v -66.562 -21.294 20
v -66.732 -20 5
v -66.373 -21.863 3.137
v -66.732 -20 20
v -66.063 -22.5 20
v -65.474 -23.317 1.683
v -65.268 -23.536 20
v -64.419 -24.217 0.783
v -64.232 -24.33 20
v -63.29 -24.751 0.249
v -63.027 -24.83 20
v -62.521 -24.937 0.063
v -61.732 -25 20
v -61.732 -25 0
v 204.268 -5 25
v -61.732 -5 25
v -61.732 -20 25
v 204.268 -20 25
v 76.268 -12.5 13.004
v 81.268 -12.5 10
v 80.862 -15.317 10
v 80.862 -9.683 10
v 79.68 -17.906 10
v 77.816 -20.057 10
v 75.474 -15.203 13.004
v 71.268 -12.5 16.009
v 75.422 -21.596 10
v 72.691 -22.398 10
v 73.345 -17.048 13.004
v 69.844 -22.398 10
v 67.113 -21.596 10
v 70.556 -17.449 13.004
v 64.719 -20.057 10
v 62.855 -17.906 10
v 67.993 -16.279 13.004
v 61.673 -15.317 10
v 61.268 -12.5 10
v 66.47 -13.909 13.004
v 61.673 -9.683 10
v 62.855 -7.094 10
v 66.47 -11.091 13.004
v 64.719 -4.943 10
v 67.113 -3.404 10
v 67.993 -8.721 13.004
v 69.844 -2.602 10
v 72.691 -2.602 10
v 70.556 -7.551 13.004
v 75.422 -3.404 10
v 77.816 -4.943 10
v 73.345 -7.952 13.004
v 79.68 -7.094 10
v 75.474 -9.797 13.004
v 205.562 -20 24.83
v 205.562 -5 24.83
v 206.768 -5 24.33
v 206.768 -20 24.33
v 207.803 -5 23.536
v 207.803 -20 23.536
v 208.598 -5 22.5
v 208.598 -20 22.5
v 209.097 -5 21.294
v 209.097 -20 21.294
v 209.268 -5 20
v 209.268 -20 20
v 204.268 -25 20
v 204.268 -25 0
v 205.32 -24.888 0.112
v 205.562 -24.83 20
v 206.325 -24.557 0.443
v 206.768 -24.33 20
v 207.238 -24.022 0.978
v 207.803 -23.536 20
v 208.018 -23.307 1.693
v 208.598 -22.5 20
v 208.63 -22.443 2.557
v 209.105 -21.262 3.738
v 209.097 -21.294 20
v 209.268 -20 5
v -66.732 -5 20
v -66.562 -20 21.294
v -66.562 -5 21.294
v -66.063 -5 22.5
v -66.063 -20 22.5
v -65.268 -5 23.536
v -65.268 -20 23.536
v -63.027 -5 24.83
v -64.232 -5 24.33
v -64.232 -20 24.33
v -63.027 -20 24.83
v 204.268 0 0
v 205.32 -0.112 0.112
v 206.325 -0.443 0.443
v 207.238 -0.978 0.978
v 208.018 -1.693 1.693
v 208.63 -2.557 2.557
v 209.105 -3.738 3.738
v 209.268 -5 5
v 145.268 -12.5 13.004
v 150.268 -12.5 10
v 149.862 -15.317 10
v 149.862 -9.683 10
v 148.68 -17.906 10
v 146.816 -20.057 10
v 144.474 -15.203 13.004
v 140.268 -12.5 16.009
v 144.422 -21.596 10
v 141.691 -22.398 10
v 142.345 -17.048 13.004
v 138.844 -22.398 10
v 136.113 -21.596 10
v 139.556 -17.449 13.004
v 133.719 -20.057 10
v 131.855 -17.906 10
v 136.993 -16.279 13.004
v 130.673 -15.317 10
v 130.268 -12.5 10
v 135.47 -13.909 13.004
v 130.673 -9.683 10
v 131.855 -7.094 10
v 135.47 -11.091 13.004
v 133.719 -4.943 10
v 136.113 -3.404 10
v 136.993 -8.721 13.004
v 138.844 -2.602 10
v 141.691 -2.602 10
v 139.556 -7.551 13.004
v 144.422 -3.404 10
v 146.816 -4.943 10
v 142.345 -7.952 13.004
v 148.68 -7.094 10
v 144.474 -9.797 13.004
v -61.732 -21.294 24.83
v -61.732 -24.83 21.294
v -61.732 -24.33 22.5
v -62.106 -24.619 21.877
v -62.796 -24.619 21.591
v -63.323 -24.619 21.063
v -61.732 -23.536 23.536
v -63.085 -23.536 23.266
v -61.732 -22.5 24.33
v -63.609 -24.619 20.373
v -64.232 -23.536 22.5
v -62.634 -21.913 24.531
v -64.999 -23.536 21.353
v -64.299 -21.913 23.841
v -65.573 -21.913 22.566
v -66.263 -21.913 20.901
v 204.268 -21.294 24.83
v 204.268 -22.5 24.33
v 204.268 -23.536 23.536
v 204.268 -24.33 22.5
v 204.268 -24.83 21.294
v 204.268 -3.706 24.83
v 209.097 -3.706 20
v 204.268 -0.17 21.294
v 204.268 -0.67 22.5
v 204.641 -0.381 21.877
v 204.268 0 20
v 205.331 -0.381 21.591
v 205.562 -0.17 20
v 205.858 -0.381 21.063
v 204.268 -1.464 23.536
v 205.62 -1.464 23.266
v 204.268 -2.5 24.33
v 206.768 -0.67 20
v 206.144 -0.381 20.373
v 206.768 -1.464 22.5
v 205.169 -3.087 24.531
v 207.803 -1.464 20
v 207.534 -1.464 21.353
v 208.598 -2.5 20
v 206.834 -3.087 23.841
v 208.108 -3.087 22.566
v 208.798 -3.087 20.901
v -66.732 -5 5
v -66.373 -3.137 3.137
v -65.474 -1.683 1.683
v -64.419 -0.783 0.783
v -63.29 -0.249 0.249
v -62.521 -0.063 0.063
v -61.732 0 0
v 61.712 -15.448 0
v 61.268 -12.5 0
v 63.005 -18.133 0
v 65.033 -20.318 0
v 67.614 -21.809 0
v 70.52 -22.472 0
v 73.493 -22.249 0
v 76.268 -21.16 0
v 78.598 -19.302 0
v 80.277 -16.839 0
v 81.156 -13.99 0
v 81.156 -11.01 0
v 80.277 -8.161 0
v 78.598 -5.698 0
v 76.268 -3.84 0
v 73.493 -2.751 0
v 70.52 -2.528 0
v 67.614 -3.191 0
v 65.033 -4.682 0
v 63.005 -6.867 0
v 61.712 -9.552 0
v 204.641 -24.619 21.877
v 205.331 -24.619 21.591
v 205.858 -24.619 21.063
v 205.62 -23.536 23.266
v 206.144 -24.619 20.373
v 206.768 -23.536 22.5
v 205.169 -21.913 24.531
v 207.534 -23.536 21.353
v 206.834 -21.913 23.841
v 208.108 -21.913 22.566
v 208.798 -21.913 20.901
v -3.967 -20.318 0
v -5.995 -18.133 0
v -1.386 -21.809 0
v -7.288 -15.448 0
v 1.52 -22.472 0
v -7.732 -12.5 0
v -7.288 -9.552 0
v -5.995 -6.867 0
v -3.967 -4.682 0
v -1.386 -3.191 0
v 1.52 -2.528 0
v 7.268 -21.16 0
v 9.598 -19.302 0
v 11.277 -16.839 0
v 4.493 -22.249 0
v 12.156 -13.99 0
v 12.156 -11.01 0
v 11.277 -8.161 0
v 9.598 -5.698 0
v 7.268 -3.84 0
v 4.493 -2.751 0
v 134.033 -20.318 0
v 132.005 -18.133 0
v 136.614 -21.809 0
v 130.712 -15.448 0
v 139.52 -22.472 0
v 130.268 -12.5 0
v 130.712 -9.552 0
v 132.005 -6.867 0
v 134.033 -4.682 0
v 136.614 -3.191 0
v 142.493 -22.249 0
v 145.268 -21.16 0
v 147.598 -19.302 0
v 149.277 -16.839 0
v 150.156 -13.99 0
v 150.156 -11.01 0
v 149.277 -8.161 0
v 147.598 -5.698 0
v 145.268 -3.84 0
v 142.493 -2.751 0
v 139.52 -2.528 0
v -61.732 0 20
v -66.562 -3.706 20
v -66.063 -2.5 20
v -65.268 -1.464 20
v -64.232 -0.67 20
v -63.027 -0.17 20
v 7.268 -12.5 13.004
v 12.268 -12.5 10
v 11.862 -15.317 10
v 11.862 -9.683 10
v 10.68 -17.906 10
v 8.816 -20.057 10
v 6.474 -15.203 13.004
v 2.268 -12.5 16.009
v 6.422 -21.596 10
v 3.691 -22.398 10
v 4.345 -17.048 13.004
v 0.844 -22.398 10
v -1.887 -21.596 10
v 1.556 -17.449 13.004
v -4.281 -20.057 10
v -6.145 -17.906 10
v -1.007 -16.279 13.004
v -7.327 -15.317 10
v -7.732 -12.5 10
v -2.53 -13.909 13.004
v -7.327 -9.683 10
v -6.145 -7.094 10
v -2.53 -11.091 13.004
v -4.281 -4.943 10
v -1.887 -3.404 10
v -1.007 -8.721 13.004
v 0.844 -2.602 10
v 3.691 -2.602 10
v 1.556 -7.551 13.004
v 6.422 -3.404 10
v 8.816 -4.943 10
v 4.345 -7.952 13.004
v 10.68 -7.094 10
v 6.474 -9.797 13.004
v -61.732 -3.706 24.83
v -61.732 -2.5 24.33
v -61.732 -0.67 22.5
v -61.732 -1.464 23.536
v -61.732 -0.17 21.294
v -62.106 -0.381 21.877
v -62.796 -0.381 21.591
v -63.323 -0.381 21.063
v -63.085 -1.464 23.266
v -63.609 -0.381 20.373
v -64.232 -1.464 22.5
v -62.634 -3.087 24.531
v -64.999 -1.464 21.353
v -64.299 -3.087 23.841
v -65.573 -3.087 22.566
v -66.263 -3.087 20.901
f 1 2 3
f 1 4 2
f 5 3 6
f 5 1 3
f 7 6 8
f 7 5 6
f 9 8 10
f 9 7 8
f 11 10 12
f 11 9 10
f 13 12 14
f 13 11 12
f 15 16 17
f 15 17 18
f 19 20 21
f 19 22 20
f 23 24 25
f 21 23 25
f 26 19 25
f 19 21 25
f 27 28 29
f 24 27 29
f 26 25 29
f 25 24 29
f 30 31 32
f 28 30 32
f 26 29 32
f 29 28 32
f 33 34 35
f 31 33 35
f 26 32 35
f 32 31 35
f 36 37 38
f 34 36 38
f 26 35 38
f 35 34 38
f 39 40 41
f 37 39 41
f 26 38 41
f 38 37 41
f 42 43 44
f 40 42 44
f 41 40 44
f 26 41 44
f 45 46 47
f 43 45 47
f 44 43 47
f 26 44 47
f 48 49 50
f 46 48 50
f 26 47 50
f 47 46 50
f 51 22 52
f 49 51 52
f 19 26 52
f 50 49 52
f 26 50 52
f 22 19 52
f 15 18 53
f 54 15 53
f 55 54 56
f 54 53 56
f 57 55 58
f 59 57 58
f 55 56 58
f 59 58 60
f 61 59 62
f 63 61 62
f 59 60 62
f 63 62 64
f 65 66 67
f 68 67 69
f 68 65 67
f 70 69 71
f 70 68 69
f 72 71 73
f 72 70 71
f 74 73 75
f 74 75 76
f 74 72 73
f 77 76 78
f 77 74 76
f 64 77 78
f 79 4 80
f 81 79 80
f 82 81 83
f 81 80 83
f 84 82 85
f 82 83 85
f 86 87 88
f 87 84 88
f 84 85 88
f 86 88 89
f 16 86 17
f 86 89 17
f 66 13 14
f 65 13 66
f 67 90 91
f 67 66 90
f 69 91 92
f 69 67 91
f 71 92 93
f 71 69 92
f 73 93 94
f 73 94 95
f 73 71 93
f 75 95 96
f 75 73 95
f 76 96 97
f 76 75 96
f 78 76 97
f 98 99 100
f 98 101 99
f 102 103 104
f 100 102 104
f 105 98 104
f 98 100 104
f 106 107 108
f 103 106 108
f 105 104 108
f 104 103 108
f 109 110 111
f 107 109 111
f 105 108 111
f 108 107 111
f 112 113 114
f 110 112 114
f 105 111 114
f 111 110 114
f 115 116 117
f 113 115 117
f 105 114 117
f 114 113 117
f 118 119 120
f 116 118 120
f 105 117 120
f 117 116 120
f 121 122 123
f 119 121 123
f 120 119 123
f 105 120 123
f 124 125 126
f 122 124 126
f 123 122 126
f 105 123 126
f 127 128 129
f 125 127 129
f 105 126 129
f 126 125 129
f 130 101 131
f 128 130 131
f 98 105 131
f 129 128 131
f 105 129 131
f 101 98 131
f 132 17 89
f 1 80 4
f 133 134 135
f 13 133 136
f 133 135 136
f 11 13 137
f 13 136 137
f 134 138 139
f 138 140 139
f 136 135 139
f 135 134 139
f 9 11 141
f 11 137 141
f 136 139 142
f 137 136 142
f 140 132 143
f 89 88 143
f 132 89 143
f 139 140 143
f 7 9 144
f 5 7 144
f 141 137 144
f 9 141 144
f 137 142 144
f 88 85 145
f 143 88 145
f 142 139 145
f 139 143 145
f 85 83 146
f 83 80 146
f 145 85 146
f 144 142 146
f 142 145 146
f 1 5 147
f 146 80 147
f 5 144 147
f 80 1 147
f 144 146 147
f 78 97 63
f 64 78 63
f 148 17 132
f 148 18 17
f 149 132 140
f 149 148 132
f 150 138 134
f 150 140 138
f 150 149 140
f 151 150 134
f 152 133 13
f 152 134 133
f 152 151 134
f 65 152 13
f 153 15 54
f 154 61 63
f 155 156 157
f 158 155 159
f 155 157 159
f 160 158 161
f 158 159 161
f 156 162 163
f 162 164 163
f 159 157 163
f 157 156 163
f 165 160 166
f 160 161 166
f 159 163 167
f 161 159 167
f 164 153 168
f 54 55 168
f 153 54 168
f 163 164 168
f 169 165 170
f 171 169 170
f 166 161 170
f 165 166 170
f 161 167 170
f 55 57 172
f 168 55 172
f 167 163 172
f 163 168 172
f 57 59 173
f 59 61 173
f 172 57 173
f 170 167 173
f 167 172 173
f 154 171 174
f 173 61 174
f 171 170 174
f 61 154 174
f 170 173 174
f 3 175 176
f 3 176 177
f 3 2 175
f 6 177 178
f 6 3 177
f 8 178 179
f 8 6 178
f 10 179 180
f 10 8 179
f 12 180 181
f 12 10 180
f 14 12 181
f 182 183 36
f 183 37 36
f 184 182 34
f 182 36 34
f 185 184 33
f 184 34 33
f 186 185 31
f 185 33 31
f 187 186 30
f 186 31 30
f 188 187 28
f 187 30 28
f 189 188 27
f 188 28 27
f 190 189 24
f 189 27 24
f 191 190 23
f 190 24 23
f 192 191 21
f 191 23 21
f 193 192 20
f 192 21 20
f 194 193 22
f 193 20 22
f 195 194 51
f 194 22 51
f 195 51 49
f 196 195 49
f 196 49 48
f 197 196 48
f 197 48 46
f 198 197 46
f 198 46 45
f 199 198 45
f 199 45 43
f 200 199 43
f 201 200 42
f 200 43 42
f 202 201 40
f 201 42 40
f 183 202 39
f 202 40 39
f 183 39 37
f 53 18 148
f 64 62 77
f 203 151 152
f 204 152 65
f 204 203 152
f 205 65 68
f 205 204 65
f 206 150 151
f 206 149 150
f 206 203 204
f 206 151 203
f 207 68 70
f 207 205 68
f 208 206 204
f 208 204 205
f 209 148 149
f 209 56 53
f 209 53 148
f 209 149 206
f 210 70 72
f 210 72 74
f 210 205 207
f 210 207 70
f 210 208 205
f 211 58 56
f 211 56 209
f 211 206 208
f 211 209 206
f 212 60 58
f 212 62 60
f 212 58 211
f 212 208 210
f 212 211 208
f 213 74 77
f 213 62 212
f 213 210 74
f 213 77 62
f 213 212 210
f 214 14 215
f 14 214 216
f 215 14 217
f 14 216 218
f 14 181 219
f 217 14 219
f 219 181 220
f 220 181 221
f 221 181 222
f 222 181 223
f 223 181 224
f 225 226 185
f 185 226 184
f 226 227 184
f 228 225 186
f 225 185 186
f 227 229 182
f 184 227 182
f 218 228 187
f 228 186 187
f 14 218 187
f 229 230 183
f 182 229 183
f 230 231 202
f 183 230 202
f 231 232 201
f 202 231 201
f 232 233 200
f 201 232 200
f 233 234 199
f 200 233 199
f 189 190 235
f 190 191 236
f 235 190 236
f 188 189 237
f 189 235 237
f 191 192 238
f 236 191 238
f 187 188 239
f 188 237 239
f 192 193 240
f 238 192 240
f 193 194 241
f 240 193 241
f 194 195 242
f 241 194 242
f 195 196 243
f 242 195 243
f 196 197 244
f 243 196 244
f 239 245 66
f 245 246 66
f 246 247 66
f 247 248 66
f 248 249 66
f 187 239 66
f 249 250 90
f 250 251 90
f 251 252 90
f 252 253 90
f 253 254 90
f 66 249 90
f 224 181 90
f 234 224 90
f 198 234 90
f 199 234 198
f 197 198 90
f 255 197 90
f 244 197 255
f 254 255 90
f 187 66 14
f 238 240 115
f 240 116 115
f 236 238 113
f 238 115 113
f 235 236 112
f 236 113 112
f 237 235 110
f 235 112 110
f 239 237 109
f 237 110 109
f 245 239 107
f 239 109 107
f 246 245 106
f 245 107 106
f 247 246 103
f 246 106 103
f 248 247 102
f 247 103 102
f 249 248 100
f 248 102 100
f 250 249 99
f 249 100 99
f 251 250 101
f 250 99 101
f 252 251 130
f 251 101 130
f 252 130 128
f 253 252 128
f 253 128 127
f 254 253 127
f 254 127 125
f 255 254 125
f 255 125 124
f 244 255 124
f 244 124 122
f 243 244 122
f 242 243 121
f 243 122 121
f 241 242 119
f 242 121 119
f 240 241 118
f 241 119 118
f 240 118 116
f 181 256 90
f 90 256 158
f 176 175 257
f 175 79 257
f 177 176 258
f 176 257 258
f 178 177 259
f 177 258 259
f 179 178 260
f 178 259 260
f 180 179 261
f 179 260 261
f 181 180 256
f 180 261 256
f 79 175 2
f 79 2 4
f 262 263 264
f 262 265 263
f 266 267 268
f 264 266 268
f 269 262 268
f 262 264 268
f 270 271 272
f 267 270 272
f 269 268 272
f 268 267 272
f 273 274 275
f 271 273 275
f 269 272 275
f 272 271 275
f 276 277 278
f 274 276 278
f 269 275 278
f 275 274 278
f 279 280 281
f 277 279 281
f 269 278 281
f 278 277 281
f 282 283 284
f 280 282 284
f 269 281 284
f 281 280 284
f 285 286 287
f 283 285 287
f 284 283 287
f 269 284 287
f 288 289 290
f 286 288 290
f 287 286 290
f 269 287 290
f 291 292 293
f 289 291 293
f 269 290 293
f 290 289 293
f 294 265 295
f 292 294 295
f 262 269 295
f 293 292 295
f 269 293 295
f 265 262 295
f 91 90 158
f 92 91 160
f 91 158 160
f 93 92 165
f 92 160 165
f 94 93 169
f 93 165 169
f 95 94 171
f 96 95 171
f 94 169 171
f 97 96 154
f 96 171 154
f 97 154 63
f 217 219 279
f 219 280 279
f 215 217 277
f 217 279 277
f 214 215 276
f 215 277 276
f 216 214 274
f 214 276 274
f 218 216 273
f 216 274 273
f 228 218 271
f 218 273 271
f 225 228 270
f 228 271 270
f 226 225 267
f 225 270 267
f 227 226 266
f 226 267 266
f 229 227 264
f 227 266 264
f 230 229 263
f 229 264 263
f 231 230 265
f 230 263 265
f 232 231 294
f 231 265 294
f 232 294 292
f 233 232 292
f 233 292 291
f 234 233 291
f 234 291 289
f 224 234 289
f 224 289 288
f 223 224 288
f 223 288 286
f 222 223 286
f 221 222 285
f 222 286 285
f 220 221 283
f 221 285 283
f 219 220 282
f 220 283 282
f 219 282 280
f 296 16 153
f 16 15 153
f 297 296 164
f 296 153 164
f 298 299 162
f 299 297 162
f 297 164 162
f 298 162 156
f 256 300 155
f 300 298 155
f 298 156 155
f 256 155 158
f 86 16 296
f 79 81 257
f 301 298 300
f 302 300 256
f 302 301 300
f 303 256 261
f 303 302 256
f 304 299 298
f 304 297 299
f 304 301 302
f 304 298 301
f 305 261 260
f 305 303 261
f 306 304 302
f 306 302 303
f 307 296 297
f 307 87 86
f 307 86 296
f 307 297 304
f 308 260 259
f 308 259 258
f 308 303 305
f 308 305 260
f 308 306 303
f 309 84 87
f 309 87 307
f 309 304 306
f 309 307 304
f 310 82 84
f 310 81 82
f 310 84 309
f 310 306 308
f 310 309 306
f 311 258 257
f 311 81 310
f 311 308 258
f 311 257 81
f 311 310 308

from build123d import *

# Parameters (mm, degrees)
F0_W     = 276
F0_H     = 25
F1_DEPTH = 25
F3_D     = 20
F3_DEPTH = 10
F3_TIP   = 6.0086061903
F4_R     = 5


with BuildPart() as f1:
    # F0 (on Front) → F1 (new body)
    with BuildSketch(Plane.XZ):
        with Locations((71.2675039768, 12.5)):
            Rectangle(F0_W, F0_H)
    extrude(amount=F1_DEPTH)

    # F3
    with Locations(Plane(origin=(0, 0, 0), x_dir=(1, 0, 0), z_dir=(0, 0, -1))):
        with Locations((140.2675039768, 12.5), (71.2675039768, 12.5), (2.2675039768, 12.5)):
            Hole(F3_D / 2, depth=F3_DEPTH)
            with Locations((0, 0, -(F3_DEPTH + F3_TIP / 2))):  # 118° drill point
                Cone(0, F3_D / 2, F3_TIP, mode=Mode.SUBTRACT)

    # F4
    f4_edges = [f1.edges().sort_by_distance(p)[0] for p in [
        (209.267504, -12.5, 25),
        (-66.732496, -12.5, 25),
        (71.267504, 0, 25),
        (71.267504, -25, 25),
        (209.267504, -12.5, 0),
        (209.267504, 0, 12.5),
        (209.267504, -25, 12.5),
        (-66.732496, -12.5, 0),
        (-66.732496, 0, 12.5),
        (-66.732496, -25, 12.5),
    ]]
    fillet(f4_edges, radius=F4_R)


solid = f1.part
